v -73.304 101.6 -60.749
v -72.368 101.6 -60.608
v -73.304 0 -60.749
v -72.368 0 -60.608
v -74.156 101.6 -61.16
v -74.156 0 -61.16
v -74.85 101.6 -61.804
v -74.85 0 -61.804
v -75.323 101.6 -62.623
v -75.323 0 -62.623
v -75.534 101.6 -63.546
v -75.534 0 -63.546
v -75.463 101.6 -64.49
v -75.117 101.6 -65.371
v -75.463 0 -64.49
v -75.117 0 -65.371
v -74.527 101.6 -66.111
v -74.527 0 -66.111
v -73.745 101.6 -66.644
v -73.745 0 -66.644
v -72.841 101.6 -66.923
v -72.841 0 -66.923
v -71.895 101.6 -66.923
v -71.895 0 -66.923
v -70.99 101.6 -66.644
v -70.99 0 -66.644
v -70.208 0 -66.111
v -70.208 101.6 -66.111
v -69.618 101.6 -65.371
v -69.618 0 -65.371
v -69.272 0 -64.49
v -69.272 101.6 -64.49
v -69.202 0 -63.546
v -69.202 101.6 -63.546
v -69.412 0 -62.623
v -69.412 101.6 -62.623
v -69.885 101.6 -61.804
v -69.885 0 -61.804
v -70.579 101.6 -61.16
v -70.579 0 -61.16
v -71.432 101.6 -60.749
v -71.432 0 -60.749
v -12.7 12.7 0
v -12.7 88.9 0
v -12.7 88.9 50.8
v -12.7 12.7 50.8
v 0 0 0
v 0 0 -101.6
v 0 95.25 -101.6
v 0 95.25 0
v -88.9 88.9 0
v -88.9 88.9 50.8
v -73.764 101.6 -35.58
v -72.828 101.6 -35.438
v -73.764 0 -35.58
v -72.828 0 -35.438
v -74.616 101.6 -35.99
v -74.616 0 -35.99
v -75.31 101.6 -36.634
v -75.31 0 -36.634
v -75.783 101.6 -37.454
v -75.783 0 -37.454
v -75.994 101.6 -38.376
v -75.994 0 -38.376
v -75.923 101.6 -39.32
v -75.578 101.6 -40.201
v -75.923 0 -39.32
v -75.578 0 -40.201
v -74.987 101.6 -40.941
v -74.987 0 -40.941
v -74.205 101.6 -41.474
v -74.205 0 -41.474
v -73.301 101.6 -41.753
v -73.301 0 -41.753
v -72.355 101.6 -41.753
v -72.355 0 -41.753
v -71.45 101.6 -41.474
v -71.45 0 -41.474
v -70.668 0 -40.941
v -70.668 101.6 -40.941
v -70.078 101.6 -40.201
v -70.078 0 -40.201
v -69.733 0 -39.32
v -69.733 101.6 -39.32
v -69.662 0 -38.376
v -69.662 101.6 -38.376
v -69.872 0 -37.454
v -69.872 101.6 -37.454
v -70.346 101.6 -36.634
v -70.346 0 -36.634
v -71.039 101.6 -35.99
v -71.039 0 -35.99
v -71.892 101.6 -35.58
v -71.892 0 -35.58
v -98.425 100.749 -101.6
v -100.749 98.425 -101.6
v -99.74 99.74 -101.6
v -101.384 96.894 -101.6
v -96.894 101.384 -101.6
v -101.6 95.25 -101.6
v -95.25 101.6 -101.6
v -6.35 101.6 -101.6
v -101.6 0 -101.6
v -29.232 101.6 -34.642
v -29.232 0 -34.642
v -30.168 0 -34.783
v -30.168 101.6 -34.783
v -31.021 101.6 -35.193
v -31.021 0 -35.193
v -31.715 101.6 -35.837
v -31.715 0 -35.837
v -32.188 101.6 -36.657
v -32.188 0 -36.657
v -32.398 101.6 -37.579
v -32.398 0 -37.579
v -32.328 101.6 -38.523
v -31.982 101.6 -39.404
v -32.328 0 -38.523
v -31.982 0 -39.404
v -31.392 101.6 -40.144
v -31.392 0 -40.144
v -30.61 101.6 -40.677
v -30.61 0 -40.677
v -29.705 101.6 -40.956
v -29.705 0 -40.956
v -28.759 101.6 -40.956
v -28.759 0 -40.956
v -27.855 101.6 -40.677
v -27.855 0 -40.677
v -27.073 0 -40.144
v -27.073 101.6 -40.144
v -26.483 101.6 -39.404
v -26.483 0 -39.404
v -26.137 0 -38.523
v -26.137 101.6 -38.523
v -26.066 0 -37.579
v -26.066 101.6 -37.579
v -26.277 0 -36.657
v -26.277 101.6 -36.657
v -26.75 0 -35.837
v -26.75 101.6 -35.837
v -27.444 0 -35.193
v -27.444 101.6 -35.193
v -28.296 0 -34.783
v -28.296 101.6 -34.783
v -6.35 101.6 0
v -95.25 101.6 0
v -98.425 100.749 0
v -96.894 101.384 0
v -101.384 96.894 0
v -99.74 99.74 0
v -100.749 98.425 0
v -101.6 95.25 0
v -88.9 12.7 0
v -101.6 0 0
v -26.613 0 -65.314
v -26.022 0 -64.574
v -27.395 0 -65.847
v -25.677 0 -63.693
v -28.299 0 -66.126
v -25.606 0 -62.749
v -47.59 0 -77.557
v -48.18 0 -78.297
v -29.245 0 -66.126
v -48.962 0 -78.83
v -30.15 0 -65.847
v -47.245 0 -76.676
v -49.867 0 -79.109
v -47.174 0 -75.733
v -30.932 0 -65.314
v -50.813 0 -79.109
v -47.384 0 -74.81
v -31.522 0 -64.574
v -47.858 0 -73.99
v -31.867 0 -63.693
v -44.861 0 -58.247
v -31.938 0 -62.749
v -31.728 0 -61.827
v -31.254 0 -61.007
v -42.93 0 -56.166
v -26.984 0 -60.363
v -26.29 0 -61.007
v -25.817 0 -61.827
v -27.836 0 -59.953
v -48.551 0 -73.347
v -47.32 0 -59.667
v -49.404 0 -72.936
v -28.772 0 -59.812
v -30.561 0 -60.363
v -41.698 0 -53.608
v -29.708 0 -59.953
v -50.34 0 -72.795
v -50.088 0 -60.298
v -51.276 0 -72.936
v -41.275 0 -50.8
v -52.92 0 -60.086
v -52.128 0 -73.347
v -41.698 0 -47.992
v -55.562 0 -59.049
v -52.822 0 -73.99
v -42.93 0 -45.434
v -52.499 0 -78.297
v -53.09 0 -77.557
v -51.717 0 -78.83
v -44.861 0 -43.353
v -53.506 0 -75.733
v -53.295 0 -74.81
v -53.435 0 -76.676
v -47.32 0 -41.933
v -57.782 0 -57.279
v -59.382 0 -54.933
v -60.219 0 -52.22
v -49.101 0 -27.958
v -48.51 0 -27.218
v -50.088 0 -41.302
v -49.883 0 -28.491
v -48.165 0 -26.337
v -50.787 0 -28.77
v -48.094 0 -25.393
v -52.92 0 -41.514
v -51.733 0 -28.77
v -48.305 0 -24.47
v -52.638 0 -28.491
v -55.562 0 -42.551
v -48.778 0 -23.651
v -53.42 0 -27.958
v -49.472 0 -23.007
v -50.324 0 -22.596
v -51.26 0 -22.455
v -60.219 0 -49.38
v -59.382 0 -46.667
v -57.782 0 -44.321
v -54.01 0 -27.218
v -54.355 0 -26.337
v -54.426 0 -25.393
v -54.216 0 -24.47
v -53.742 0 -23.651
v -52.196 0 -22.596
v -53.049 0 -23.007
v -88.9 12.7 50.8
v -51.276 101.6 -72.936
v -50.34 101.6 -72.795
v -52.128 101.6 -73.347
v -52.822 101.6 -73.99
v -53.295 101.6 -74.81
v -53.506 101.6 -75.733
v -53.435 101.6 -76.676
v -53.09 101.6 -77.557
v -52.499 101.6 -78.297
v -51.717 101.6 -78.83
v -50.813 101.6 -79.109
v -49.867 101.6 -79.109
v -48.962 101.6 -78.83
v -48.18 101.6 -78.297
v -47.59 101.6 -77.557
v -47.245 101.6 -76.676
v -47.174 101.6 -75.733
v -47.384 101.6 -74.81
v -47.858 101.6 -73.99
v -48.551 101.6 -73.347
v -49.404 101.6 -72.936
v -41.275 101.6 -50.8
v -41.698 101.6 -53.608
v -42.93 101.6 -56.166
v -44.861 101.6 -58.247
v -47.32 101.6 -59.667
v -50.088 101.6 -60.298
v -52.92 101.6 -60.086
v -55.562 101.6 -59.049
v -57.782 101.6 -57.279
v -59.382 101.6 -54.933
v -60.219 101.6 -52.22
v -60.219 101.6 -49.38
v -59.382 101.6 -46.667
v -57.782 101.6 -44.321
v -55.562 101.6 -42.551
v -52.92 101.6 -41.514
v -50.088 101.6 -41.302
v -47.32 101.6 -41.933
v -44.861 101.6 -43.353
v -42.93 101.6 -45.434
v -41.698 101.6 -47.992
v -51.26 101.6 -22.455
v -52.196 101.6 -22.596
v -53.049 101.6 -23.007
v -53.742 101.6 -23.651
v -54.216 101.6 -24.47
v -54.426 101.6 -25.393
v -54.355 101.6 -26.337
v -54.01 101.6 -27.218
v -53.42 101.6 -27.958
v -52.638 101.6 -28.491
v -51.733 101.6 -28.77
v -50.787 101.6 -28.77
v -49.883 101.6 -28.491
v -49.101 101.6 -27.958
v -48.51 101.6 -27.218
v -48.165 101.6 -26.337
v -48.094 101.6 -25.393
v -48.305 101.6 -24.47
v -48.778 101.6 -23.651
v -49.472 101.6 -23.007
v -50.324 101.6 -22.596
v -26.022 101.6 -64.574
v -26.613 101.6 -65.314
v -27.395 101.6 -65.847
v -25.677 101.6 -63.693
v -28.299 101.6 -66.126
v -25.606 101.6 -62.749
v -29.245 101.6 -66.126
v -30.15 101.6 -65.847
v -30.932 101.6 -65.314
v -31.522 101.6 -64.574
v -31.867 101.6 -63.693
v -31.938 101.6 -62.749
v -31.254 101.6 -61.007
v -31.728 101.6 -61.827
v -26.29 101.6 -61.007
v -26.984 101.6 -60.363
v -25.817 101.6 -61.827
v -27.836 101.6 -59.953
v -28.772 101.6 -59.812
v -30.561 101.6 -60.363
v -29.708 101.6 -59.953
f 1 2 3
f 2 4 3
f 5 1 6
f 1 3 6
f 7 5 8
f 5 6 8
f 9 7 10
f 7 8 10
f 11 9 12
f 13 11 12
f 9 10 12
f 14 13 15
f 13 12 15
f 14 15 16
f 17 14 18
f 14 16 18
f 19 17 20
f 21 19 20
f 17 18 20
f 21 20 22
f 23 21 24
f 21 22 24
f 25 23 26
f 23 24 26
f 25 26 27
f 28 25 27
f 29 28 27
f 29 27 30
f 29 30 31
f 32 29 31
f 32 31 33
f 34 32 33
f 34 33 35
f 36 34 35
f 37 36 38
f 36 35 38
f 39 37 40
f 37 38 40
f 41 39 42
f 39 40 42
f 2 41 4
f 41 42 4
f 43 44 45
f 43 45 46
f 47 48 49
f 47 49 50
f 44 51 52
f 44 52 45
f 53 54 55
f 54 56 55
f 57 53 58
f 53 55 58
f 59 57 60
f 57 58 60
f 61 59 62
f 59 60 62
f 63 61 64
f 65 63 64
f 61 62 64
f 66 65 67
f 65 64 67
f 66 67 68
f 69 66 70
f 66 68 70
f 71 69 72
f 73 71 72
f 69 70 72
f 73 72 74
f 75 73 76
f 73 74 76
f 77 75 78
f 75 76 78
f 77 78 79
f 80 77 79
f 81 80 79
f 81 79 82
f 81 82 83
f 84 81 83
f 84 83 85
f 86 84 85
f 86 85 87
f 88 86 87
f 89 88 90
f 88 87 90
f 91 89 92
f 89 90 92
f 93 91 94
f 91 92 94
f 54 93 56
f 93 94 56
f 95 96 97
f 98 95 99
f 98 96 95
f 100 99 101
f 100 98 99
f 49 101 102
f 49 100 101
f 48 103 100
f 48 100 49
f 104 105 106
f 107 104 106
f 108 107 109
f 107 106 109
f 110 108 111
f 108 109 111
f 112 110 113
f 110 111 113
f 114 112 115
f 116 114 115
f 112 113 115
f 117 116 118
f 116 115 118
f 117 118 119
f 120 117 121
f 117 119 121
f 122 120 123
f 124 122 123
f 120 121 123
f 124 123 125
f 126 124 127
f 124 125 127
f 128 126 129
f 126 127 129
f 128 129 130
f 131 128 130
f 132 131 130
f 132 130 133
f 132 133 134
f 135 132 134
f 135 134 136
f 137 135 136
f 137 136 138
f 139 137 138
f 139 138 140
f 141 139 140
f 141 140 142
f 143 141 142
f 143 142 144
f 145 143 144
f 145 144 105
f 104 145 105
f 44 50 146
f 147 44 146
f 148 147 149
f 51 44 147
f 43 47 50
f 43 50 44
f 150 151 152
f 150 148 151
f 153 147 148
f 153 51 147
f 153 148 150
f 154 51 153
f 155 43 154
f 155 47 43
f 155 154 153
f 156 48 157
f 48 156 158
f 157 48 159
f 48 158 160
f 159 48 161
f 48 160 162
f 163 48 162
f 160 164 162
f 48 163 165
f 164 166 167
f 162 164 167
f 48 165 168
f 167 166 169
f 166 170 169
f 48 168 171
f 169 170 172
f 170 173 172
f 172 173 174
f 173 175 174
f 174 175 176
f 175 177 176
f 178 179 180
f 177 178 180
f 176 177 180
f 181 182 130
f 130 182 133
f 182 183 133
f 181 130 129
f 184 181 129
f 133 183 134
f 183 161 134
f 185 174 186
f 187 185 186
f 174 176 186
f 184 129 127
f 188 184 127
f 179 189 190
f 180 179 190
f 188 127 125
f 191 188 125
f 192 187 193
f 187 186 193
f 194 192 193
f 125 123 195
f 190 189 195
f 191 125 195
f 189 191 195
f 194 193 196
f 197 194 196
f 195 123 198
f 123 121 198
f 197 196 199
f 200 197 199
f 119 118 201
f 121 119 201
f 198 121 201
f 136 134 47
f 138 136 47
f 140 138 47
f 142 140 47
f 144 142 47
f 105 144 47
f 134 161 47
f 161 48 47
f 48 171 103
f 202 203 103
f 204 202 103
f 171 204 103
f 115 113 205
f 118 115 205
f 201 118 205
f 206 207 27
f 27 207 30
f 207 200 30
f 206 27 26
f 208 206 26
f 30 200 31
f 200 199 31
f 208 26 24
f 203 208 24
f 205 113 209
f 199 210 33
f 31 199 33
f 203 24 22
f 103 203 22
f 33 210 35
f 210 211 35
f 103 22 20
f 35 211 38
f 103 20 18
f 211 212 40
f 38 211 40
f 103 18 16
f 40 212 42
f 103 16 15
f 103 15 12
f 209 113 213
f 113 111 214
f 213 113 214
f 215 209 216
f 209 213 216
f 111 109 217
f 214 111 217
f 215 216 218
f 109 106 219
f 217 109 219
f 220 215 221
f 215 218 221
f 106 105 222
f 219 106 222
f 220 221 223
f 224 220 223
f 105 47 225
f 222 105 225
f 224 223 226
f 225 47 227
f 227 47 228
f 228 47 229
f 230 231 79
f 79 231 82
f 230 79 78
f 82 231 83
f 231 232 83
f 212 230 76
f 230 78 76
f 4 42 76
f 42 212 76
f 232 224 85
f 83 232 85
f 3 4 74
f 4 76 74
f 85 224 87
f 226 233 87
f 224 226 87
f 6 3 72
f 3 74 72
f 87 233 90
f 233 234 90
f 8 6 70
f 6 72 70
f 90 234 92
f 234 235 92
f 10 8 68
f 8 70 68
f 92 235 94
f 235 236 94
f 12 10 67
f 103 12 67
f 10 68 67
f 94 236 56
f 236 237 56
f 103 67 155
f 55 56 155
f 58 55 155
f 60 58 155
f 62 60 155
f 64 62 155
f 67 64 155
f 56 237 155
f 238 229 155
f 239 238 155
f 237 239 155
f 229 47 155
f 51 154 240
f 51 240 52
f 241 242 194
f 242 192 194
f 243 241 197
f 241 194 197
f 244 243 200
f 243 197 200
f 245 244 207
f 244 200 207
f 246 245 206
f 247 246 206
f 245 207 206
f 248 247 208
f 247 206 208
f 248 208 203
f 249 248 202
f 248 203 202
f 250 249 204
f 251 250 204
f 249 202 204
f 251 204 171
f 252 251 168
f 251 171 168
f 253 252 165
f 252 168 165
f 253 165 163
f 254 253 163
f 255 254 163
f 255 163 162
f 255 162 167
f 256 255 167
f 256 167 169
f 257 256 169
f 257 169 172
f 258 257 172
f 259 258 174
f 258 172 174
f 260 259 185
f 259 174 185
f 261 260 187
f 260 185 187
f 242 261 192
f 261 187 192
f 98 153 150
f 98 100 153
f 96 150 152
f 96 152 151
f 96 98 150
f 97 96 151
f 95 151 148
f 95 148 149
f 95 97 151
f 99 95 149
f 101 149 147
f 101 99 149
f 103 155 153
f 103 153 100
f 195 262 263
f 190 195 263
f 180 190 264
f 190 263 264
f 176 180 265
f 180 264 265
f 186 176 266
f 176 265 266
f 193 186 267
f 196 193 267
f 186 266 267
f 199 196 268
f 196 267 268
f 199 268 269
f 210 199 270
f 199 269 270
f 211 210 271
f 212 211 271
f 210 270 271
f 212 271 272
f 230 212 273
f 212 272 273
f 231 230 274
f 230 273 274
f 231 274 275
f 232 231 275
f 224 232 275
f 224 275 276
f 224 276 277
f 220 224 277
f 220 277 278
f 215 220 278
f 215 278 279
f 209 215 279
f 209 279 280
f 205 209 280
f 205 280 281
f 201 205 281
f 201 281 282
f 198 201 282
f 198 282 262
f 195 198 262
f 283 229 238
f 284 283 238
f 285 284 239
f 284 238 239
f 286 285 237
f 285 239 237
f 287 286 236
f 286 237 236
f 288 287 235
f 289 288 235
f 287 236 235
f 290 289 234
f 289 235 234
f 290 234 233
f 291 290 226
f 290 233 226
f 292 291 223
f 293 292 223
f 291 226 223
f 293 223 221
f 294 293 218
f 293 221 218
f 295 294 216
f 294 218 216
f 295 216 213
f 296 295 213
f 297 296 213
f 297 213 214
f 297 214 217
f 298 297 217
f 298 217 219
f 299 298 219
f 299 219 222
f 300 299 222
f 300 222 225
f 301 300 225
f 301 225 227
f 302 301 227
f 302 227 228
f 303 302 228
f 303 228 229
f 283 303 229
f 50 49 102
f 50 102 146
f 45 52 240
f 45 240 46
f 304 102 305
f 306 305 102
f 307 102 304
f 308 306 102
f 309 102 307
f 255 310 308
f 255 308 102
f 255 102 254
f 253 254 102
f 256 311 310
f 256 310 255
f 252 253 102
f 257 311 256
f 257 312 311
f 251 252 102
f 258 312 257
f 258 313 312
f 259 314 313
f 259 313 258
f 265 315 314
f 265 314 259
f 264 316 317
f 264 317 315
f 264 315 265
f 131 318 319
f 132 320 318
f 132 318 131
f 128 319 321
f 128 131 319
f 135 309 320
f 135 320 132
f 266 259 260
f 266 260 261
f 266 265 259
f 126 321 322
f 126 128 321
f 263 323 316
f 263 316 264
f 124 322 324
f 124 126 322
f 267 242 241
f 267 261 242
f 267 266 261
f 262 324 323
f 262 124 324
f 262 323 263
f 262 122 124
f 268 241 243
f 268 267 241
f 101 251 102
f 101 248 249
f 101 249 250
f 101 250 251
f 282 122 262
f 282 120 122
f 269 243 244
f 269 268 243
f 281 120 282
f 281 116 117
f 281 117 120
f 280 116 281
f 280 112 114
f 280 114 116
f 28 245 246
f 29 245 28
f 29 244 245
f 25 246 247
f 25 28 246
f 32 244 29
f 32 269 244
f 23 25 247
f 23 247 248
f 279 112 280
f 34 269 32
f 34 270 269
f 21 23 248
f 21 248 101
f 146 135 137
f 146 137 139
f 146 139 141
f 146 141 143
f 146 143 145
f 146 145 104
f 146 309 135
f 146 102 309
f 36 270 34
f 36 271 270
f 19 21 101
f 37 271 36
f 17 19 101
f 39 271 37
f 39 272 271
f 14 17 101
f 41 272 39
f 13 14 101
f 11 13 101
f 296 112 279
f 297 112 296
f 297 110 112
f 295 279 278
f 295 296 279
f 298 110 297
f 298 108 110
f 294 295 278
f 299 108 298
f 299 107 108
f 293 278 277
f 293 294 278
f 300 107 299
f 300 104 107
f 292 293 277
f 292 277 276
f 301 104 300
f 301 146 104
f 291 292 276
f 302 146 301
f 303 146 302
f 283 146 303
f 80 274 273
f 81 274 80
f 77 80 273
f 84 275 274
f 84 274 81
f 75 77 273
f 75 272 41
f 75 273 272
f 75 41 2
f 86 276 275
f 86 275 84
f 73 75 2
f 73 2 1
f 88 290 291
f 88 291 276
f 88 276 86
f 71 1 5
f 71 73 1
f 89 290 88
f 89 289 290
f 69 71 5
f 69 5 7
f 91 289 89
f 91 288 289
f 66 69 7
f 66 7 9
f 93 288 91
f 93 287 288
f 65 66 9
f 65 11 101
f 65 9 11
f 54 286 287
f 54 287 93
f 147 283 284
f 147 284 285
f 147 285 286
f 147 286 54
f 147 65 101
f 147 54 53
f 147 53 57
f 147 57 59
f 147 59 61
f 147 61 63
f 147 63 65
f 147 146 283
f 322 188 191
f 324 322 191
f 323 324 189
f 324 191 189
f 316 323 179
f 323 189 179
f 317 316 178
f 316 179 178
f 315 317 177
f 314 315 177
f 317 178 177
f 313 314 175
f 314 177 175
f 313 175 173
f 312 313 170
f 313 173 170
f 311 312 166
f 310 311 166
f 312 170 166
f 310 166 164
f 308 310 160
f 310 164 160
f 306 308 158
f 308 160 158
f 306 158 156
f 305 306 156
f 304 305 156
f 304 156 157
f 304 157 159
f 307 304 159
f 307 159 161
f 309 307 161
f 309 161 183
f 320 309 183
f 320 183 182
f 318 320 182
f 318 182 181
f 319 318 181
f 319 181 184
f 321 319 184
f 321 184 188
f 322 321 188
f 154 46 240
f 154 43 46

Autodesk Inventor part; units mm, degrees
ref_plane "YZ Plane" through (0, 0, 0) normal (1, 0, 0) x (0, 1, 0)
ref_plane "XZ Plane" through (0, 0, 0) normal (0, 1, 0) x (-1, 0, 0)
ref_plane "XY Plane" through (0, 0, 0) normal (0, 0, 1) x (1, 0, 0)
sketch "Sketch1" plane through (0, 0, 0) normal (0, 1, 0) x (-1, 0, 0)
  line L0 (0, 0) -> (101.6, 0)
  line L1 (101.6, 0) -> (101.6, -101.6)
  line L2 (101.6, -101.6) -> (0, -101.6)
  line L3 (0, -101.6) -> (0, 0)
  dimension "d0" = 101.6
  dimension "d1" = 101.6
extrude "Extrusion1" add sketch "Sketch1" along normal blind 101.6
sketch "Sketch2" plane through (0, 101.6, 0) normal (0, 1, 0) x (1, 0, 0)
  circle A0 centre (-50.8, 50.8) radius 9.525
  line L0 (-101.6, 0) -> (0, 0) projected
  line L1 (-101.6, 101.6) -> (-101.6, 0) projected
  point P0 (-51.2601, 25.6301)
  point P1 (-29.2322, 37.8166)
  point P2 (-28.7721, 62.9865)
  point P3 (-50.3399, 75.9699)
  point P4 (-72.3678, 63.7834)
  point P5 (-72.8279, 38.6135)
  dimension "d6" = 360
  dimension "d25" = 19.05
  dimension "d26" = 50.8
  dimension "d27" = 50.8
extrude "Extrusion2" cut sketch "Sketch2" against normal through all
hole "Hole1" at (-50.8, 101.6, -50.8) at (-51.2601, 101.6, -25.6301) at (-29.2322, 101.6, -37.8166) at (-28.7721, 101.6, -62.9865) at (-50.3399, 101.6, -75.9699) at (-72.3678, 101.6, -63.7834) at (-72.8279, 101.6, -38.6135) direction (0, -1, 0) diameter 6.35 end through all
fillet "Fillet1" radius 6.35 1 edges at (-101.6, 101.6, -50.8)
chamfer "Chamfer1" distance 6.35 angle 45 1 edges at (0, 101.6, -50.8)
sketch "Sketch3" plane through (-101.6, 0, 0) normal (0, 0, 1) x (1, 0, 0)
  line L0 (12.7, 88.9) -> (88.9, 88.9)
  line L1 (88.9, 88.9) -> (88.9, 12.7)
  line L2 (88.9, 12.7) -> (12.7, 12.7)
  line L3 (12.7, 12.7) -> (12.7, 88.9)
  line L4 (12.7, 88.9) -> (88.9, 12.7) construction
  line L5 (88.9, 88.9) -> (12.7, 12.7) construction
  point P0 (101.6, 0)
  point P1 (50.8, 50.8)
  dimension "d21" = 76.2
  dimension "d22" = 76.2
extrude "Extrusion3" add sketch "Sketch3" along normal blind 50.8
properties part number "BasicCube"
